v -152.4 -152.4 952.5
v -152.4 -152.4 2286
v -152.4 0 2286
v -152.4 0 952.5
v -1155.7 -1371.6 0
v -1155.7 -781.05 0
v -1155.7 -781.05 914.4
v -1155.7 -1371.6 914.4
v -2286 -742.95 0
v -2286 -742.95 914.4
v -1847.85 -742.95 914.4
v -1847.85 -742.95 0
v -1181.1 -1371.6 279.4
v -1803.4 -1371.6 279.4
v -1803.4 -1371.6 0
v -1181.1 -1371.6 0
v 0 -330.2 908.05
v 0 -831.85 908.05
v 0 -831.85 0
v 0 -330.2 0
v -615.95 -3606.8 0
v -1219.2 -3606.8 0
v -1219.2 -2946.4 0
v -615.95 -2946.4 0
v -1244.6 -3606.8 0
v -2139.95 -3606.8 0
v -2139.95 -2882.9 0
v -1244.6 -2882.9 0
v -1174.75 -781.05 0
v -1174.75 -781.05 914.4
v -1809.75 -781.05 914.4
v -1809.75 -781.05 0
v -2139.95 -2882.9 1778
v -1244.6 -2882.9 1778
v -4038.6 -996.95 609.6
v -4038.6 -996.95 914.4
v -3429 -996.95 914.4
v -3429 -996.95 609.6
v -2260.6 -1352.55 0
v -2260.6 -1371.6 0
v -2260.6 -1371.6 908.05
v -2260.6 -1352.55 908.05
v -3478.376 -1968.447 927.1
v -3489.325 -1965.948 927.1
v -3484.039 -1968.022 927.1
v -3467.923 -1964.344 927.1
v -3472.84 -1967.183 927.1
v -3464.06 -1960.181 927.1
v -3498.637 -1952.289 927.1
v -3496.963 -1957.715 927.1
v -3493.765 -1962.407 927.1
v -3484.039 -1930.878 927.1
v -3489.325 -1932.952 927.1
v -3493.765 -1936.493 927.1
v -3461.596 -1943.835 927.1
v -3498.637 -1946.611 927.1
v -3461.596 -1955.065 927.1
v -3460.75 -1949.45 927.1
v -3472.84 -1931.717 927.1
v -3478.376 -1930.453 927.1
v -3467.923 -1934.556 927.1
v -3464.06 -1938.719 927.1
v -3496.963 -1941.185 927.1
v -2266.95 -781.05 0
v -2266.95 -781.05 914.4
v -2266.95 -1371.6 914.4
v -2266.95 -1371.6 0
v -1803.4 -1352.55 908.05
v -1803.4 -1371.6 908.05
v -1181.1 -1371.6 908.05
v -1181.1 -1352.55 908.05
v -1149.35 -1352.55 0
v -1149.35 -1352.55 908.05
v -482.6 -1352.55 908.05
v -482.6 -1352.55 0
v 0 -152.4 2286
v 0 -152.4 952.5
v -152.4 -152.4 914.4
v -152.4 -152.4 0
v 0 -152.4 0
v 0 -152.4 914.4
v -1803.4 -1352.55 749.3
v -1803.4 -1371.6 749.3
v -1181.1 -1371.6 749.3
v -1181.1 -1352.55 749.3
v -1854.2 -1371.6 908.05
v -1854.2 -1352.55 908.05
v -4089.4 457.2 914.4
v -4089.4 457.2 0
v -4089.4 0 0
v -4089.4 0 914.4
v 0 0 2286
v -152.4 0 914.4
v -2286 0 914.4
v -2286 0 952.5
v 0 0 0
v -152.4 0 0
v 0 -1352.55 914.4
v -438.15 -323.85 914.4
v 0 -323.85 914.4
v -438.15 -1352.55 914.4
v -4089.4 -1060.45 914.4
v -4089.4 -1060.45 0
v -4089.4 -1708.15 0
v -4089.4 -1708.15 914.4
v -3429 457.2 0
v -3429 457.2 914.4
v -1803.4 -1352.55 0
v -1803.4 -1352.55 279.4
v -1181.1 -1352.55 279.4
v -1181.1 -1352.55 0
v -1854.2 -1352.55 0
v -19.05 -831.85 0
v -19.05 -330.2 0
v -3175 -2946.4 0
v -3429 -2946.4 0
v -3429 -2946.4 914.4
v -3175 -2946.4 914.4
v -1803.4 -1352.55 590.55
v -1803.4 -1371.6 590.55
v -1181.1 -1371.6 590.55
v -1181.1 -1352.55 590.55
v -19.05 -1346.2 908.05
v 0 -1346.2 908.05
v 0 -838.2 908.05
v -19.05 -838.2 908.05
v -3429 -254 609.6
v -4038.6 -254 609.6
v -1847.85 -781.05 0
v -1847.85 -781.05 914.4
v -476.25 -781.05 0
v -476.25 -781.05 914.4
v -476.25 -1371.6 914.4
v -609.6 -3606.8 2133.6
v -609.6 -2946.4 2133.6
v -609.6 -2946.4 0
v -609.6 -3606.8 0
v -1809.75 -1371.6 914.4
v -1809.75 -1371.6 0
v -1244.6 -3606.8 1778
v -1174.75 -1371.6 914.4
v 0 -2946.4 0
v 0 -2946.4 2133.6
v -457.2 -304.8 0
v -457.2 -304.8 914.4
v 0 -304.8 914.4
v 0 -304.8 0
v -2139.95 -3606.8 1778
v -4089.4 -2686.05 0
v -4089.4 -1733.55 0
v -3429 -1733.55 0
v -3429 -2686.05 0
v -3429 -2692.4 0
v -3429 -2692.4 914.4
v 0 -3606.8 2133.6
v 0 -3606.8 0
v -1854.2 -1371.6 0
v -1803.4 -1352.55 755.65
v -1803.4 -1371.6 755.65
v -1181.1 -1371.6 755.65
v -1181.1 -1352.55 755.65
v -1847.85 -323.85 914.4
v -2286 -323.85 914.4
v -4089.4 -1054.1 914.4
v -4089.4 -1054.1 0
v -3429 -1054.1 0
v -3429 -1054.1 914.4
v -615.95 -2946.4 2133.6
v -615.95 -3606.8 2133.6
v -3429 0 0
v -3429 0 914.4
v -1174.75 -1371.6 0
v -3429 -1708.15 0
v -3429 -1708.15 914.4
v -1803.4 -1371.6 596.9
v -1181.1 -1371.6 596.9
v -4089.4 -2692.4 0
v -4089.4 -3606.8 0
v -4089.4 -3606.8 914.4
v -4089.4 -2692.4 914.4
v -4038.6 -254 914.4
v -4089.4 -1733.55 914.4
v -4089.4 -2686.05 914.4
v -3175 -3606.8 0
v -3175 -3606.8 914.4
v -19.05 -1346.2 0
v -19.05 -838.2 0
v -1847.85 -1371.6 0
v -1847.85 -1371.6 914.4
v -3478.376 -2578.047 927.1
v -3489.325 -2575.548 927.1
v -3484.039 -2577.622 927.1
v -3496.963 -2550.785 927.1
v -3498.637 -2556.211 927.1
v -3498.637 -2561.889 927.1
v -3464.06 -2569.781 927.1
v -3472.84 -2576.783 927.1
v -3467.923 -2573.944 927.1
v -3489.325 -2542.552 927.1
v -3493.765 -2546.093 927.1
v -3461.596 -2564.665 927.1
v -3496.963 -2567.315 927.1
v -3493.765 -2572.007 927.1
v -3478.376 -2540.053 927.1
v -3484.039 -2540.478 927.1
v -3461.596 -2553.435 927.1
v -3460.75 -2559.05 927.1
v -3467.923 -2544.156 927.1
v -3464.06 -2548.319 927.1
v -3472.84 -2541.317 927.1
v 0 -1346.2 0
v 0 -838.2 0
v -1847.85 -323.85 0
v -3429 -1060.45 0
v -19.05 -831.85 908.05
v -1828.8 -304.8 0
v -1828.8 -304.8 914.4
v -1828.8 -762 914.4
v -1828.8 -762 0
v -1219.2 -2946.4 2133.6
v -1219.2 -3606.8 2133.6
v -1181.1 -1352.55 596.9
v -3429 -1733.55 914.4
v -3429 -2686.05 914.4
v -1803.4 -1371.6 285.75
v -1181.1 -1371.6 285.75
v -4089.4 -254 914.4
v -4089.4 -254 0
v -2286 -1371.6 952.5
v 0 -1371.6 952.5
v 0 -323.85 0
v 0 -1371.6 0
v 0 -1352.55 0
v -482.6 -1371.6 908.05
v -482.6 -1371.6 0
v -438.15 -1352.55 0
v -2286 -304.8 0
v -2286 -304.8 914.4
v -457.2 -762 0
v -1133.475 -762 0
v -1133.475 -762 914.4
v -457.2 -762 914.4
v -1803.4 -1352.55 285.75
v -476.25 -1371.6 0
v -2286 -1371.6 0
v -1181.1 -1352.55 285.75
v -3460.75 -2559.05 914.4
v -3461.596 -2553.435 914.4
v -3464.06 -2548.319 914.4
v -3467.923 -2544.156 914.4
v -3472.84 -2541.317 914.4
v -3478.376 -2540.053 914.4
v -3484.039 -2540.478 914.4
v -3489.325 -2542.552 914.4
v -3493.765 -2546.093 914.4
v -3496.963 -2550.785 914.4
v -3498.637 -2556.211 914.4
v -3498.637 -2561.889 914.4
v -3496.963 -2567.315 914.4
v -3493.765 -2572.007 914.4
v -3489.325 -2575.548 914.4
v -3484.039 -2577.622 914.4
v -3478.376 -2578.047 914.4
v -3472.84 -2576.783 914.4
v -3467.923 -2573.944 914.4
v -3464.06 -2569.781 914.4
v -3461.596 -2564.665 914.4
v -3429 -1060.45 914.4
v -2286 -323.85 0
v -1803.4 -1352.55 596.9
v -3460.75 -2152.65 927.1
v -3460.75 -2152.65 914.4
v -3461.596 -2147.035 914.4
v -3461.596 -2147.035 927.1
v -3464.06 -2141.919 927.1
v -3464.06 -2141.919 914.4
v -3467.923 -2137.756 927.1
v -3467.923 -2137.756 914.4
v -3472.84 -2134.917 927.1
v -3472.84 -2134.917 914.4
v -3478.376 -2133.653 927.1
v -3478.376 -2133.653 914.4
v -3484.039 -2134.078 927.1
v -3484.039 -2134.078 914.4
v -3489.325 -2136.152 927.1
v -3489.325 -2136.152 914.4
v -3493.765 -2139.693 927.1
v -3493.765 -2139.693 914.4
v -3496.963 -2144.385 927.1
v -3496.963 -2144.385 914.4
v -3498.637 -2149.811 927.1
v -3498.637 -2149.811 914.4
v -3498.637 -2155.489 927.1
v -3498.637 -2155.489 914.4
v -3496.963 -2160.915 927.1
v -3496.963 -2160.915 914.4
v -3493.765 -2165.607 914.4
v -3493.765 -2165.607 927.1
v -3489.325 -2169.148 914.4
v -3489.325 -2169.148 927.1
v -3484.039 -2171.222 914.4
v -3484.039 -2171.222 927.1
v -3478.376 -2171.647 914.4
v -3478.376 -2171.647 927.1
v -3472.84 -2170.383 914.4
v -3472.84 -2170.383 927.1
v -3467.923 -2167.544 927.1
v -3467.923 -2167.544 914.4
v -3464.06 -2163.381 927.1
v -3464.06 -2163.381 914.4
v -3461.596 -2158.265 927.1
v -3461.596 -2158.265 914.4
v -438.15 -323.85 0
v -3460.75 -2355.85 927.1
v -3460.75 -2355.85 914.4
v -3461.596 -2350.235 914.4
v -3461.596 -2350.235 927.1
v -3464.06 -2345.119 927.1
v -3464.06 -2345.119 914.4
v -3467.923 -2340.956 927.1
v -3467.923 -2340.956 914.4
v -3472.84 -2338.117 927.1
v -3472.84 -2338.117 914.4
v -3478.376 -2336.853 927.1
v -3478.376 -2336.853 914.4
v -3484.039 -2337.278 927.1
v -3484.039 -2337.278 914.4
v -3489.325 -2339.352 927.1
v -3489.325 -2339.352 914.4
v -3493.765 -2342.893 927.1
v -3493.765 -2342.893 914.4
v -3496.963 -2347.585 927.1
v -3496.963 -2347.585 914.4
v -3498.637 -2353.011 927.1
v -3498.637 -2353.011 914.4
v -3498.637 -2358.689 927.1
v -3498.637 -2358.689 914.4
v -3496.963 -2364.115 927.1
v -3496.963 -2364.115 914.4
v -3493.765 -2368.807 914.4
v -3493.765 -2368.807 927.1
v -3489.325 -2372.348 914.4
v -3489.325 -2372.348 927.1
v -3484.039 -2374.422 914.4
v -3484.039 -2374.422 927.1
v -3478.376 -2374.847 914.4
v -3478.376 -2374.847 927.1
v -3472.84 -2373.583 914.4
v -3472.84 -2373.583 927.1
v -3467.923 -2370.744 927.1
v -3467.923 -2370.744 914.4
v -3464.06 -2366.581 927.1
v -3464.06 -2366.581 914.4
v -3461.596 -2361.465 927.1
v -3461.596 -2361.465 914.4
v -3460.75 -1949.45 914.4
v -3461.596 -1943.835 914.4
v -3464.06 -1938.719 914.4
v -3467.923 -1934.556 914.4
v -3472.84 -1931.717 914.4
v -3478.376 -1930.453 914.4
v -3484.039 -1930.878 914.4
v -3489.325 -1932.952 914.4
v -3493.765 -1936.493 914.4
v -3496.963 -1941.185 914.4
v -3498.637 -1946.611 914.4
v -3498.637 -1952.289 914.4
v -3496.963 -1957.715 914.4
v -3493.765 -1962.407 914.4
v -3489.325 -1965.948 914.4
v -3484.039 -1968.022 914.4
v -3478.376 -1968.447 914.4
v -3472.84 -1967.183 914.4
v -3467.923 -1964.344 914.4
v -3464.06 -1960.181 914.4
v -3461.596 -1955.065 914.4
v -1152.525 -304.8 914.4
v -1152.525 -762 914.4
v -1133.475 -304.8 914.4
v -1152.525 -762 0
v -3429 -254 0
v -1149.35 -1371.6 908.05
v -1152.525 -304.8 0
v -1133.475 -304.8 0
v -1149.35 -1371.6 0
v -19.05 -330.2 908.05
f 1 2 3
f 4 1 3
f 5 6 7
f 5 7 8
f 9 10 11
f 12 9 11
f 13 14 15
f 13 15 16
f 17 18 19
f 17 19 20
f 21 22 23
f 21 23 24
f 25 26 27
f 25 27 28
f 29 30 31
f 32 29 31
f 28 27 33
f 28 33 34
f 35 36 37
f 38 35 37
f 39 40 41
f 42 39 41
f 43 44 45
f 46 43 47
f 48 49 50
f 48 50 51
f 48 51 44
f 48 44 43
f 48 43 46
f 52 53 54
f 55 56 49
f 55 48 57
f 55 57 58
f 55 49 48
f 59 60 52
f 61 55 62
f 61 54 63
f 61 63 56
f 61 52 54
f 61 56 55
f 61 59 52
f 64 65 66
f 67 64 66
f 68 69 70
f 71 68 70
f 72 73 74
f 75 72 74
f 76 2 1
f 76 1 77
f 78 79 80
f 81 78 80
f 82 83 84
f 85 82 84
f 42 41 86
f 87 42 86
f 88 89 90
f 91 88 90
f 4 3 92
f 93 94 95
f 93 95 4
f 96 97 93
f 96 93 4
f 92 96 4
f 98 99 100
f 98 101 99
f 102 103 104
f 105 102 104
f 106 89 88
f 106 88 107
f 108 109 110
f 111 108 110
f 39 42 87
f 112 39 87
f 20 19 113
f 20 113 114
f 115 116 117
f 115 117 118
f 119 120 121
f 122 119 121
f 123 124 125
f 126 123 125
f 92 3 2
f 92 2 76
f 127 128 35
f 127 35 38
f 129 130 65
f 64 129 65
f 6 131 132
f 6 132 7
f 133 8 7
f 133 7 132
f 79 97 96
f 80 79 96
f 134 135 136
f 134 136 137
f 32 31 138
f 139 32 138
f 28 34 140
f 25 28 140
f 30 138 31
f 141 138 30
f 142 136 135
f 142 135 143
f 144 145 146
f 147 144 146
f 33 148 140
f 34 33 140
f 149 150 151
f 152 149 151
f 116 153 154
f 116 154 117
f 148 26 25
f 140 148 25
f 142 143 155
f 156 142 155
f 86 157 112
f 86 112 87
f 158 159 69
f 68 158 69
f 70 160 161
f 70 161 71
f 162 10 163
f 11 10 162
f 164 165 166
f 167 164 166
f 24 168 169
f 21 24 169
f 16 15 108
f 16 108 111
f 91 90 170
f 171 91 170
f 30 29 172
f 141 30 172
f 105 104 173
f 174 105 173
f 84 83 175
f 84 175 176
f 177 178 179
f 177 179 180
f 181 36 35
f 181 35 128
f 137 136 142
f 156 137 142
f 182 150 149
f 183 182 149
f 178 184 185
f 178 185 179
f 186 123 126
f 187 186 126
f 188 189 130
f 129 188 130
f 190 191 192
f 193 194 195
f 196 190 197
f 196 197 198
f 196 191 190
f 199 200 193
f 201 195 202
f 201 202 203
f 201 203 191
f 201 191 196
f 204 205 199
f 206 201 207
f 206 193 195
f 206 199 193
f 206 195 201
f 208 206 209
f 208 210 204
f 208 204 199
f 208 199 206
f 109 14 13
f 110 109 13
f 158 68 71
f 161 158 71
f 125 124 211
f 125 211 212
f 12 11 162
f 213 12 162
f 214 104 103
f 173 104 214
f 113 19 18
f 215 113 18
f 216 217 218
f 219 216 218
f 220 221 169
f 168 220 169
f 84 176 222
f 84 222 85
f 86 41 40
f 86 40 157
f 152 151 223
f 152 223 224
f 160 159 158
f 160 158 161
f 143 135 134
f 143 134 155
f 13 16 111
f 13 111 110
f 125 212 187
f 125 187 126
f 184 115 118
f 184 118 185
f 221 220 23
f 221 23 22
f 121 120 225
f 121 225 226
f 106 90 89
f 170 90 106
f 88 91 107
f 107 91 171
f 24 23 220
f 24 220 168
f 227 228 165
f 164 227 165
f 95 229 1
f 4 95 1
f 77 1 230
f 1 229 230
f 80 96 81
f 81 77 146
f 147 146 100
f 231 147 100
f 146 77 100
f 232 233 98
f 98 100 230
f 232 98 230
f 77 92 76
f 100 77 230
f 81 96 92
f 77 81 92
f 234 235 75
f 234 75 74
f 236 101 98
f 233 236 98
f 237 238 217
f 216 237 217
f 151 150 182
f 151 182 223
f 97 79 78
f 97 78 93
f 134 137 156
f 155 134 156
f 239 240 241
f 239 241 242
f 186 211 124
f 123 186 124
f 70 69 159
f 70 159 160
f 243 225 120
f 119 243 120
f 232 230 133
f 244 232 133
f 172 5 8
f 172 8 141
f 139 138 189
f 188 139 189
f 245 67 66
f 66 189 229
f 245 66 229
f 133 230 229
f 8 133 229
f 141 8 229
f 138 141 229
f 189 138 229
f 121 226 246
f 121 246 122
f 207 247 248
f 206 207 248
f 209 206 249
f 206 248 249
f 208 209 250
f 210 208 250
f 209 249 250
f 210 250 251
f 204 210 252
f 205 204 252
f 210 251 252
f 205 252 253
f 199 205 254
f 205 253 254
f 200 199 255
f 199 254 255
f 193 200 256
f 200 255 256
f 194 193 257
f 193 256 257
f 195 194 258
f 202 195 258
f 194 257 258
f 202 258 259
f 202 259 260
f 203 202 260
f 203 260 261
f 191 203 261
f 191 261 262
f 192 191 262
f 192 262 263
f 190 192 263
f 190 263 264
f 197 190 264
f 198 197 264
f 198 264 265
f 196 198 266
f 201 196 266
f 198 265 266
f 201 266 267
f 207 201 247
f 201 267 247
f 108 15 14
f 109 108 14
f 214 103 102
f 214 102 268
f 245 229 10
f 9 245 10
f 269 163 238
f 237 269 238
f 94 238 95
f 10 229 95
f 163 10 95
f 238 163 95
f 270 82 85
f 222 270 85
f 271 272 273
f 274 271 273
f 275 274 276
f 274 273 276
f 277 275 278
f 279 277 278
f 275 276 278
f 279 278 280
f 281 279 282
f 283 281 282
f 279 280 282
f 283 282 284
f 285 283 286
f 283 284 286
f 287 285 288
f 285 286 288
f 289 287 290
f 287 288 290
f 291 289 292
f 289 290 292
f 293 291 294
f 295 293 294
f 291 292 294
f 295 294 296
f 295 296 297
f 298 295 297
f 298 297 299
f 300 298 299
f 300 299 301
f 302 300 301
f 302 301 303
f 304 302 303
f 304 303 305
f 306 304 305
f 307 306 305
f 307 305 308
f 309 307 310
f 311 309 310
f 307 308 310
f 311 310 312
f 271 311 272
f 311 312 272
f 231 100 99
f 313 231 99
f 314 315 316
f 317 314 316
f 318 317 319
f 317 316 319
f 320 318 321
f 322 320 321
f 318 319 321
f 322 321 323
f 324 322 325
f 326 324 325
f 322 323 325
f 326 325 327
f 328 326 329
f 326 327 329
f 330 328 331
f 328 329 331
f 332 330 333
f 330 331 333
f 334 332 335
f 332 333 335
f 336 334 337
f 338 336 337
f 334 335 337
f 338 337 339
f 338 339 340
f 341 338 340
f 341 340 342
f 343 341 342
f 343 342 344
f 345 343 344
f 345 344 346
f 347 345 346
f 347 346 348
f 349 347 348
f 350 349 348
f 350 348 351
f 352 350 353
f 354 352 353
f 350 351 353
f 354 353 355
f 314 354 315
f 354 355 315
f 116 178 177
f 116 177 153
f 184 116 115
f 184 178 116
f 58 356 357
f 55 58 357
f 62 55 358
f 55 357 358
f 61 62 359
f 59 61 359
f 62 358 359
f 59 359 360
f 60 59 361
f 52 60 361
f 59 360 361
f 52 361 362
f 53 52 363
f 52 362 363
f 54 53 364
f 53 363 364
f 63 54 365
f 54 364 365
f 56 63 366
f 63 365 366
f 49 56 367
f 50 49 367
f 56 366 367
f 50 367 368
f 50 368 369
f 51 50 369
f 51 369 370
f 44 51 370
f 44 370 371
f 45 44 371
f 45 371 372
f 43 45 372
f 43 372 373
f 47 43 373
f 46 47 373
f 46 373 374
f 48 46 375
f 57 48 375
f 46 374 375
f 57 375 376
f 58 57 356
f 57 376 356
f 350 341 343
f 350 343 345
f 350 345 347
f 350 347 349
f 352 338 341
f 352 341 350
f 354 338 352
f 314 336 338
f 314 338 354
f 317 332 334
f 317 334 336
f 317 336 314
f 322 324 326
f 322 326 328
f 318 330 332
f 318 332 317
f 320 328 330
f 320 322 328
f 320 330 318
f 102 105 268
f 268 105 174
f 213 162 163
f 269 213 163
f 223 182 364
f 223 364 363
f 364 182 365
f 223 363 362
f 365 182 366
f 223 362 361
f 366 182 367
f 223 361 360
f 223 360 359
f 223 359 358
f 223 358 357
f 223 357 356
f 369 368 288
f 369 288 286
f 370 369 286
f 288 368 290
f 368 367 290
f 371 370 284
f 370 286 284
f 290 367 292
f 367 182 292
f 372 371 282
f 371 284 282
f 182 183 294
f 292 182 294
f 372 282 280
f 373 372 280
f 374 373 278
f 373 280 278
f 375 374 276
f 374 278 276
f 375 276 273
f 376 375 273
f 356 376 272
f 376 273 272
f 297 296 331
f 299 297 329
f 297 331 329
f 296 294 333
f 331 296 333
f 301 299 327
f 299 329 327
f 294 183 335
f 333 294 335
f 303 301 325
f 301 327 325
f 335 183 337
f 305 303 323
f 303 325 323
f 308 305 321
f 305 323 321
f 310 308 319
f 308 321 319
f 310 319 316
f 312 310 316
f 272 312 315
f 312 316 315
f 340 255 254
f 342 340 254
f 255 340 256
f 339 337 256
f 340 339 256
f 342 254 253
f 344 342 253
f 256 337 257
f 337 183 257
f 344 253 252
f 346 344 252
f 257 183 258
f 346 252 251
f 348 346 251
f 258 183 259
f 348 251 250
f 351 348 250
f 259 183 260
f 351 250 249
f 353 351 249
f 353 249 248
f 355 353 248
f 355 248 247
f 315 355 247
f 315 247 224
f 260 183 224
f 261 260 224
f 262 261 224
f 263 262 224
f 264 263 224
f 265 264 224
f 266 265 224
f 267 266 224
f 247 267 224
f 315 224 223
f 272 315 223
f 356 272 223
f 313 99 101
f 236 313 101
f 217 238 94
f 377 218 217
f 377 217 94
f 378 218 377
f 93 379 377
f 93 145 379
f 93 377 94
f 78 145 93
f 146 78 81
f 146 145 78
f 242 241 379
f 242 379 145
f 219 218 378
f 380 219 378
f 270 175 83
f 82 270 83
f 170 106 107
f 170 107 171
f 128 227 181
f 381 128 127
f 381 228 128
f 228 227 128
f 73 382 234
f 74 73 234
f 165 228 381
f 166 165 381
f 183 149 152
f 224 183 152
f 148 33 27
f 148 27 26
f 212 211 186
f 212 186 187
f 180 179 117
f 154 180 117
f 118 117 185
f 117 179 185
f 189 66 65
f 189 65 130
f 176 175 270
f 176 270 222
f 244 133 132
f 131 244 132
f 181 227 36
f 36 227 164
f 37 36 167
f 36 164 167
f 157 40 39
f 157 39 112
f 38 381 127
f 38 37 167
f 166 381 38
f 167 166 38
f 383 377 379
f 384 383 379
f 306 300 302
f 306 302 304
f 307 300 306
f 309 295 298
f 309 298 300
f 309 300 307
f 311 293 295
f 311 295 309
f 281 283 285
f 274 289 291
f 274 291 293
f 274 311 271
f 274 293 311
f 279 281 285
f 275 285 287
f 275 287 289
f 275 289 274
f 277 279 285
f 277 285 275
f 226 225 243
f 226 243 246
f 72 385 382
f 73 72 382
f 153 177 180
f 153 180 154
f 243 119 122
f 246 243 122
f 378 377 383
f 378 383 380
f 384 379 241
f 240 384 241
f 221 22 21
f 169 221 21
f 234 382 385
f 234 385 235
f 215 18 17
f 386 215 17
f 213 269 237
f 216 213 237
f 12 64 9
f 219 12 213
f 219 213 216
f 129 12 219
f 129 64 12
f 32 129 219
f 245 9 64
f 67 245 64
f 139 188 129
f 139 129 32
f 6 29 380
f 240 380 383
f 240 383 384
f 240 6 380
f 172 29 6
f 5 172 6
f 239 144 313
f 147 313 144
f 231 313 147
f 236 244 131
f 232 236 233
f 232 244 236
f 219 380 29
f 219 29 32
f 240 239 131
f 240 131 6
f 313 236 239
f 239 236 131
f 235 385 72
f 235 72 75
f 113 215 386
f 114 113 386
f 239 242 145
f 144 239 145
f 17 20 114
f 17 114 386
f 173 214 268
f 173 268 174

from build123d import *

# Parameters (mm, degrees)
F0_W      = 152.4
F0_H      = 152.4
F1_DEPTH  = 2286
F4_DEPTH  = 38.1
F7_DEPTH  = 914.4
F9_DEPTH  = 914.4
F11_DEPTH = 914.4
F13_DEPTH = 914.4
F14_W     = 19.05
F14_H     = 590.55
F15_DEPTH = 914.4
F16_W     = 19.05
F16_H     = 457.2
F17_DEPTH = 914.4
F18_W     = 508
F18_H     = 908.05
F19_DEPTH = 19.05
F20_W     = 501.65
F20_H     = 908.05
F21_DEPTH = 19.05
F22_W     = 622.3
F22_H     = 152.4
F23_DEPTH = 19.05
F22_H_2   = 304.8
F22_H_3   = 279.4
F24_W     = 406.4
F24_H     = 908.05
F25_DEPTH = 19.05
F26_W     = 666.75
F26_H     = 908.05
F27_DEPTH = 19.05
F29_W     = 609.6
F29_H     = 660.4
F30_DEPTH = 2133.6
F31_W     = 603.25
F31_H     = 660.4
F32_DEPTH = 2133.6
F33_W     = 895.35
F33_H     = 723.9
F34_DEPTH = 1778
F37_W     = 660.4
F37_H     = 800.1
F38_DEPTH = 914.4
F40_DEPTH = 914.4
F41_W     = 660.4
F41_H     = 952.5
F42_DEPTH = 914.4
F43_W     = 660.4
F43_H     = 457.2
F44_DEPTH = 914.4
F46_W     = 660.4
F46_H     = 647.7
F47_DEPTH = 914.4
F48_DEPTH = 12.7
F49_W     = 609.6
F49_H     = 762
F50_DEPTH = 304.8


with BuildPart() as f1:
    # F0 (on Top) → F1 (new body)
    with BuildSketch(Plane.XY):
        with Locations((-76.2, -76.2)):
            Rectangle(F0_W, F0_H)
    extrude(amount=F1_DEPTH)

    # F3 (on offset) → F4 (join)
    with BuildSketch(Plane(origin=(0, 0, 914.4), x_dir=(1, 0, 0), z_dir=(0, 0, -1))):
        Polygon((-152.4, 152.4), (0, 152.4), (0, 1371.6), (-2286, 1371.6), (-2286, 0), (-152.4, 0), align=None)
    extrude(amount=-F4_DEPTH)

    # F6 (on face) → F7 (join, through all)
    with BuildSketch(Plane(origin=(0, 0, 914.4), x_dir=(1, 0, 0), z_dir=(0, 0, -1))):
        Polygon((0, 1352.55), (0, 1371.6), (-457.2, 1371.6), (-457.2, 304.8), (0, 304.8), (0, 323.85), (-438.15, 323.85), (-438.15, 1352.55), align=None)
    extrude(amount=F7_DEPTH)

    # F8 (on face) → F9 (join, through all)
    with BuildSketch(Plane(origin=(0, 0, 914.4), x_dir=(1, 0, 0), z_dir=(0, 0, -1))):
        Polygon((-2266.95, 1371.6), (-2286, 1371.6), (-2286, 762), (-1828.8, 762), (-1828.8, 1371.6), (-1847.85, 1371.6), (-1847.85, 781.05), (-2266.95, 781.05), align=None)
    extrude(amount=F9_DEPTH)

    # F10 (on face) → F11 (join, through all)
    with BuildSketch(Plane(origin=(0, 0, 914.4), x_dir=(1, 0, 0), z_dir=(0, 0, -1))):
        Polygon((-1828.8, 762), (-2286, 762), (-2286, 742.95), (-1847.85, 742.95), (-1847.85, 323.85), (-2286, 323.85), (-2286, 304.8), (-1828.8, 304.8), align=None)
    extrude(amount=F11_DEPTH)

    # F12 (on face) → F13 (join, through all)
    with BuildSketch(Plane(origin=(0, 0, 914.4), x_dir=(1, 0, 0), z_dir=(0, 0, -1))):
        Polygon((-1809.75, 1371.6), (-1828.8, 1371.6), (-1828.8, 762), (-457.2, 762), (-457.2, 1371.6), (-476.25, 1371.6), (-476.25, 781.05), (-1809.75, 781.05), align=None)
    extrude(amount=F13_DEPTH)

    # F14 (on face) → F15 (join, through all)
    with BuildSketch(Plane(origin=(0, 0, 914.4), x_dir=(1, 0, 0), z_dir=(0, 0, -1))):
        with Locations((-1165.225, 1076.325)):
            Rectangle(F14_W, F14_H)
    extrude(amount=F15_DEPTH)

    # F16 (on face) → F17 (join, through all)
    with BuildSketch(Plane(origin=(0, 0, 914.4), x_dir=(1, 0, 0), z_dir=(0, 0, -1))):
        with Locations((-1143, 533.4)):
            Rectangle(F16_W, F16_H)
    extrude(amount=F17_DEPTH)


with BuildPart() as f19:
    # F18 (on face) → F19 (new body)
    with BuildSketch(Plane.YZ):
        with Locations((-1092.2, 454.025)):
            Rectangle(F18_W, F18_H)
    extrude(amount=-F19_DEPTH)


with BuildPart() as f21:
    # F20 (on face) → F21 (new body)
    with BuildSketch(Plane.YZ):
        with Locations((-581.025, 454.025)):
            Rectangle(F20_W, F20_H)
    extrude(amount=-F21_DEPTH)


with BuildPart() as f23:
    # F22 (on face) → F23 (new body)
    with BuildSketch(Plane.XZ.offset(1371.6)):
        with Locations((-1492.25, 831.85)):
            Rectangle(F22_W, F22_H)
    extrude(amount=-F23_DEPTH)


with BuildPart() as f23b:
    # F22 (on face) → F23, piece 2 (new body)
    with BuildSketch(Plane.XZ.offset(1371.6)):
        with Locations((-1492.25, 673.1)):
            Rectangle(F22_W, F22_H)
    extrude(amount=-F23_DEPTH)


with BuildPart() as f23c:
    # F22 (on face) → F23, piece 3 (new body)
    with BuildSketch(Plane.XZ.offset(1371.6)):
        with Locations((-1492.25, 438.15)):
            Rectangle(F22_W, F22_H_2)
    extrude(amount=-F23_DEPTH)


with BuildPart() as f23d:
    # F22 (on face) → F23, piece 4 (new body)
    with BuildSketch(Plane.XZ.offset(1371.6)):
        with Locations((-1492.25, 139.7)):
            Rectangle(F22_W, F22_H_3)
    extrude(amount=-F23_DEPTH)


with BuildPart() as f25:
    # F24 (on face) → F25 (new body)
    with BuildSketch(Plane.XZ.offset(1371.6)):
        with Locations((-2057.4, 454.025)):
            Rectangle(F24_W, F24_H)
    extrude(amount=-F25_DEPTH)


with BuildPart() as f27:
    # F26 (on face) → F27 (new body)
    with BuildSketch(Plane.XZ.offset(1371.6)):
        with Locations((-815.975, 454.025)):
            Rectangle(F26_W, F26_H)
    extrude(amount=-F27_DEPTH)


with BuildPart() as f30:
    # F29 (on face) → F30 (new body)
    with BuildSketch(Plane(origin=(0, 0, 0), x_dir=(1, 0, 0), z_dir=(0, 0, -1))):
        with Locations((-304.8, 3276.6)):
            Rectangle(F29_W, F29_H)
    extrude(amount=-F30_DEPTH)


with BuildPart() as f32:
    # F31 (on face) → F32 (new body, through all)
    with BuildSketch(Plane(origin=(0, 0, 0), x_dir=(1, 0, 0), z_dir=(0, 0, -1))):
        with Locations((-917.575, 3276.6)):
            Rectangle(F31_W, F31_H)
    extrude(amount=-F32_DEPTH)


with BuildPart() as f34:
    # F33 (on face) → F34 (new body)
    with BuildSketch(Plane(origin=(0, 0, 0), x_dir=(1, 0, 0), z_dir=(0, 0, -1))):
        with Locations((-1692.275, 3244.85)):
            Rectangle(F33_W, F33_H)
    extrude(amount=-F34_DEPTH)


with BuildPart() as f38:
    # F37 (on face) → F38 (new body)
    with BuildSketch(Plane(origin=(0, 0, 0), x_dir=(1, 0, 0), z_dir=(0, 0, -1))):
        with Locations((-3759.2, 654.05)):
            Rectangle(F37_W, F37_H)
    extrude(amount=-F38_DEPTH)

    # F49 (on face) → F50 (cut)
    with BuildSketch(Plane.XY.offset(914.4)):
        with Locations((-3733.8, -615.95)):
            Rectangle(F49_W, F49_H)
    extrude(amount=-F50_DEPTH, mode=Mode.SUBTRACT)


with BuildPart() as f40:
    # F39 (on face) → F40 (new body)
    with BuildSketch(Plane(origin=(0, 0, 0), x_dir=(1, 0, 0), z_dir=(0, 0, -1))):
        Polygon((-3175, 2946.4), (-3175, 3606.8), (-4089.4, 3606.8), (-4089.4, 2692.4), (-3429, 2692.4), (-3429, 2946.4), align=None)
    extrude(amount=-F40_DEPTH)


with BuildPart() as f42:
    # F41 (on face) → F42 (new body)
    with BuildSketch(Plane(origin=(0, 0, 0), x_dir=(1, 0, 0), z_dir=(0, 0, -1))):
        with Locations((-3759.2, 2209.8)):
            Rectangle(F41_W, F41_H)
    extrude(amount=-F42_DEPTH)

    # F45 (on face) → F48 (join)
    with BuildSketch(Plane.XY.offset(914.4)):
        with BuildLine():
            ThreePointArc((-3479.8, -2540), (-3498.85, -2559.05), (-3479.8, -2578.1))
            Line((-3479.8, -2578.1), (-3479.8, -2540))
        make_face()
        with BuildLine():
            ThreePointArc((-3479.8, -1930.4), (-3498.85, -1949.45), (-3479.8, -1968.5))
            Line((-3479.8, -1968.5), (-3479.8, -1930.4))
        make_face()
        with BuildLine():
            Line((-3479.8, -1930.4), (-3479.8, -1968.5))
            ThreePointArc((-3479.8, -1968.5), (-3466.3296158184, -1962.9203841816), (-3460.75, -1949.45))
            ThreePointArc((-3460.75, -1949.45), (-3466.3296158184, -1935.9796158184), (-3479.8, -1930.4))
        make_face()
        with BuildLine():
            ThreePointArc((-3479.8, -2133.6), (-3498.85, -2152.65), (-3479.8, -2171.7))
            Line((-3479.8, -2171.7), (-3479.8, -2133.6))
        make_face()
        with BuildLine():
            Line((-3479.8, -2133.6), (-3479.8, -2171.7))
            ThreePointArc((-3479.8, -2171.7), (-3466.3296158184, -2166.1203841816), (-3460.75, -2152.65))
            ThreePointArc((-3460.75, -2152.65), (-3466.3296158184, -2139.1796158184), (-3479.8, -2133.6))
        make_face()
        with BuildLine():
            ThreePointArc((-3479.8, -2336.8), (-3498.85, -2355.85), (-3479.8, -2374.9))
            Line((-3479.8, -2374.9), (-3479.8, -2336.8))
        make_face()
        with BuildLine():
            Line((-3479.8, -2336.8), (-3479.8, -2374.9))
            ThreePointArc((-3479.8, -2374.9), (-3466.3296158184, -2369.3203841816), (-3460.75, -2355.85))
            ThreePointArc((-3460.75, -2355.85), (-3466.3296158184, -2342.3796158184), (-3479.8, -2336.8))
        make_face()
        with BuildLine():
            Line((-3479.8, -2540), (-3479.8, -2578.1))
            ThreePointArc((-3479.8, -2578.1), (-3466.3296158184, -2572.5203841816), (-3460.75, -2559.05))
            ThreePointArc((-3460.75, -2559.05), (-3466.3296158184, -2545.5796158184), (-3479.8, -2540))
        make_face()
    extrude(amount=F48_DEPTH)


with BuildPart() as f44:
    # F43 (on face) → F44 (new body)
    with BuildSketch(Plane(origin=(0, 0, 0), x_dir=(1, 0, 0), z_dir=(0, 0, -1))):
        with Locations((-3759.2, -228.6)):
            Rectangle(F43_W, F43_H)
    extrude(amount=-F44_DEPTH)


with BuildPart() as f47:
    # F46 (on face) → F47 (new body)
    with BuildSketch(Plane(origin=(0, 0, 0), x_dir=(1, 0, 0), z_dir=(0, 0, -1))):
        with Locations((-3759.2, 1384.3)):
            Rectangle(F46_W, F46_H)
    extrude(amount=-F47_DEPTH)


solid = Compound([f1.part, f19.part, f21.part, f23.part, f23b.part, f23c.part, f23d.part, f25.part, f27.part, f30.part, f32.part, f34.part, f38.part, f40.part, f42.part, f44.part, f47.part])
